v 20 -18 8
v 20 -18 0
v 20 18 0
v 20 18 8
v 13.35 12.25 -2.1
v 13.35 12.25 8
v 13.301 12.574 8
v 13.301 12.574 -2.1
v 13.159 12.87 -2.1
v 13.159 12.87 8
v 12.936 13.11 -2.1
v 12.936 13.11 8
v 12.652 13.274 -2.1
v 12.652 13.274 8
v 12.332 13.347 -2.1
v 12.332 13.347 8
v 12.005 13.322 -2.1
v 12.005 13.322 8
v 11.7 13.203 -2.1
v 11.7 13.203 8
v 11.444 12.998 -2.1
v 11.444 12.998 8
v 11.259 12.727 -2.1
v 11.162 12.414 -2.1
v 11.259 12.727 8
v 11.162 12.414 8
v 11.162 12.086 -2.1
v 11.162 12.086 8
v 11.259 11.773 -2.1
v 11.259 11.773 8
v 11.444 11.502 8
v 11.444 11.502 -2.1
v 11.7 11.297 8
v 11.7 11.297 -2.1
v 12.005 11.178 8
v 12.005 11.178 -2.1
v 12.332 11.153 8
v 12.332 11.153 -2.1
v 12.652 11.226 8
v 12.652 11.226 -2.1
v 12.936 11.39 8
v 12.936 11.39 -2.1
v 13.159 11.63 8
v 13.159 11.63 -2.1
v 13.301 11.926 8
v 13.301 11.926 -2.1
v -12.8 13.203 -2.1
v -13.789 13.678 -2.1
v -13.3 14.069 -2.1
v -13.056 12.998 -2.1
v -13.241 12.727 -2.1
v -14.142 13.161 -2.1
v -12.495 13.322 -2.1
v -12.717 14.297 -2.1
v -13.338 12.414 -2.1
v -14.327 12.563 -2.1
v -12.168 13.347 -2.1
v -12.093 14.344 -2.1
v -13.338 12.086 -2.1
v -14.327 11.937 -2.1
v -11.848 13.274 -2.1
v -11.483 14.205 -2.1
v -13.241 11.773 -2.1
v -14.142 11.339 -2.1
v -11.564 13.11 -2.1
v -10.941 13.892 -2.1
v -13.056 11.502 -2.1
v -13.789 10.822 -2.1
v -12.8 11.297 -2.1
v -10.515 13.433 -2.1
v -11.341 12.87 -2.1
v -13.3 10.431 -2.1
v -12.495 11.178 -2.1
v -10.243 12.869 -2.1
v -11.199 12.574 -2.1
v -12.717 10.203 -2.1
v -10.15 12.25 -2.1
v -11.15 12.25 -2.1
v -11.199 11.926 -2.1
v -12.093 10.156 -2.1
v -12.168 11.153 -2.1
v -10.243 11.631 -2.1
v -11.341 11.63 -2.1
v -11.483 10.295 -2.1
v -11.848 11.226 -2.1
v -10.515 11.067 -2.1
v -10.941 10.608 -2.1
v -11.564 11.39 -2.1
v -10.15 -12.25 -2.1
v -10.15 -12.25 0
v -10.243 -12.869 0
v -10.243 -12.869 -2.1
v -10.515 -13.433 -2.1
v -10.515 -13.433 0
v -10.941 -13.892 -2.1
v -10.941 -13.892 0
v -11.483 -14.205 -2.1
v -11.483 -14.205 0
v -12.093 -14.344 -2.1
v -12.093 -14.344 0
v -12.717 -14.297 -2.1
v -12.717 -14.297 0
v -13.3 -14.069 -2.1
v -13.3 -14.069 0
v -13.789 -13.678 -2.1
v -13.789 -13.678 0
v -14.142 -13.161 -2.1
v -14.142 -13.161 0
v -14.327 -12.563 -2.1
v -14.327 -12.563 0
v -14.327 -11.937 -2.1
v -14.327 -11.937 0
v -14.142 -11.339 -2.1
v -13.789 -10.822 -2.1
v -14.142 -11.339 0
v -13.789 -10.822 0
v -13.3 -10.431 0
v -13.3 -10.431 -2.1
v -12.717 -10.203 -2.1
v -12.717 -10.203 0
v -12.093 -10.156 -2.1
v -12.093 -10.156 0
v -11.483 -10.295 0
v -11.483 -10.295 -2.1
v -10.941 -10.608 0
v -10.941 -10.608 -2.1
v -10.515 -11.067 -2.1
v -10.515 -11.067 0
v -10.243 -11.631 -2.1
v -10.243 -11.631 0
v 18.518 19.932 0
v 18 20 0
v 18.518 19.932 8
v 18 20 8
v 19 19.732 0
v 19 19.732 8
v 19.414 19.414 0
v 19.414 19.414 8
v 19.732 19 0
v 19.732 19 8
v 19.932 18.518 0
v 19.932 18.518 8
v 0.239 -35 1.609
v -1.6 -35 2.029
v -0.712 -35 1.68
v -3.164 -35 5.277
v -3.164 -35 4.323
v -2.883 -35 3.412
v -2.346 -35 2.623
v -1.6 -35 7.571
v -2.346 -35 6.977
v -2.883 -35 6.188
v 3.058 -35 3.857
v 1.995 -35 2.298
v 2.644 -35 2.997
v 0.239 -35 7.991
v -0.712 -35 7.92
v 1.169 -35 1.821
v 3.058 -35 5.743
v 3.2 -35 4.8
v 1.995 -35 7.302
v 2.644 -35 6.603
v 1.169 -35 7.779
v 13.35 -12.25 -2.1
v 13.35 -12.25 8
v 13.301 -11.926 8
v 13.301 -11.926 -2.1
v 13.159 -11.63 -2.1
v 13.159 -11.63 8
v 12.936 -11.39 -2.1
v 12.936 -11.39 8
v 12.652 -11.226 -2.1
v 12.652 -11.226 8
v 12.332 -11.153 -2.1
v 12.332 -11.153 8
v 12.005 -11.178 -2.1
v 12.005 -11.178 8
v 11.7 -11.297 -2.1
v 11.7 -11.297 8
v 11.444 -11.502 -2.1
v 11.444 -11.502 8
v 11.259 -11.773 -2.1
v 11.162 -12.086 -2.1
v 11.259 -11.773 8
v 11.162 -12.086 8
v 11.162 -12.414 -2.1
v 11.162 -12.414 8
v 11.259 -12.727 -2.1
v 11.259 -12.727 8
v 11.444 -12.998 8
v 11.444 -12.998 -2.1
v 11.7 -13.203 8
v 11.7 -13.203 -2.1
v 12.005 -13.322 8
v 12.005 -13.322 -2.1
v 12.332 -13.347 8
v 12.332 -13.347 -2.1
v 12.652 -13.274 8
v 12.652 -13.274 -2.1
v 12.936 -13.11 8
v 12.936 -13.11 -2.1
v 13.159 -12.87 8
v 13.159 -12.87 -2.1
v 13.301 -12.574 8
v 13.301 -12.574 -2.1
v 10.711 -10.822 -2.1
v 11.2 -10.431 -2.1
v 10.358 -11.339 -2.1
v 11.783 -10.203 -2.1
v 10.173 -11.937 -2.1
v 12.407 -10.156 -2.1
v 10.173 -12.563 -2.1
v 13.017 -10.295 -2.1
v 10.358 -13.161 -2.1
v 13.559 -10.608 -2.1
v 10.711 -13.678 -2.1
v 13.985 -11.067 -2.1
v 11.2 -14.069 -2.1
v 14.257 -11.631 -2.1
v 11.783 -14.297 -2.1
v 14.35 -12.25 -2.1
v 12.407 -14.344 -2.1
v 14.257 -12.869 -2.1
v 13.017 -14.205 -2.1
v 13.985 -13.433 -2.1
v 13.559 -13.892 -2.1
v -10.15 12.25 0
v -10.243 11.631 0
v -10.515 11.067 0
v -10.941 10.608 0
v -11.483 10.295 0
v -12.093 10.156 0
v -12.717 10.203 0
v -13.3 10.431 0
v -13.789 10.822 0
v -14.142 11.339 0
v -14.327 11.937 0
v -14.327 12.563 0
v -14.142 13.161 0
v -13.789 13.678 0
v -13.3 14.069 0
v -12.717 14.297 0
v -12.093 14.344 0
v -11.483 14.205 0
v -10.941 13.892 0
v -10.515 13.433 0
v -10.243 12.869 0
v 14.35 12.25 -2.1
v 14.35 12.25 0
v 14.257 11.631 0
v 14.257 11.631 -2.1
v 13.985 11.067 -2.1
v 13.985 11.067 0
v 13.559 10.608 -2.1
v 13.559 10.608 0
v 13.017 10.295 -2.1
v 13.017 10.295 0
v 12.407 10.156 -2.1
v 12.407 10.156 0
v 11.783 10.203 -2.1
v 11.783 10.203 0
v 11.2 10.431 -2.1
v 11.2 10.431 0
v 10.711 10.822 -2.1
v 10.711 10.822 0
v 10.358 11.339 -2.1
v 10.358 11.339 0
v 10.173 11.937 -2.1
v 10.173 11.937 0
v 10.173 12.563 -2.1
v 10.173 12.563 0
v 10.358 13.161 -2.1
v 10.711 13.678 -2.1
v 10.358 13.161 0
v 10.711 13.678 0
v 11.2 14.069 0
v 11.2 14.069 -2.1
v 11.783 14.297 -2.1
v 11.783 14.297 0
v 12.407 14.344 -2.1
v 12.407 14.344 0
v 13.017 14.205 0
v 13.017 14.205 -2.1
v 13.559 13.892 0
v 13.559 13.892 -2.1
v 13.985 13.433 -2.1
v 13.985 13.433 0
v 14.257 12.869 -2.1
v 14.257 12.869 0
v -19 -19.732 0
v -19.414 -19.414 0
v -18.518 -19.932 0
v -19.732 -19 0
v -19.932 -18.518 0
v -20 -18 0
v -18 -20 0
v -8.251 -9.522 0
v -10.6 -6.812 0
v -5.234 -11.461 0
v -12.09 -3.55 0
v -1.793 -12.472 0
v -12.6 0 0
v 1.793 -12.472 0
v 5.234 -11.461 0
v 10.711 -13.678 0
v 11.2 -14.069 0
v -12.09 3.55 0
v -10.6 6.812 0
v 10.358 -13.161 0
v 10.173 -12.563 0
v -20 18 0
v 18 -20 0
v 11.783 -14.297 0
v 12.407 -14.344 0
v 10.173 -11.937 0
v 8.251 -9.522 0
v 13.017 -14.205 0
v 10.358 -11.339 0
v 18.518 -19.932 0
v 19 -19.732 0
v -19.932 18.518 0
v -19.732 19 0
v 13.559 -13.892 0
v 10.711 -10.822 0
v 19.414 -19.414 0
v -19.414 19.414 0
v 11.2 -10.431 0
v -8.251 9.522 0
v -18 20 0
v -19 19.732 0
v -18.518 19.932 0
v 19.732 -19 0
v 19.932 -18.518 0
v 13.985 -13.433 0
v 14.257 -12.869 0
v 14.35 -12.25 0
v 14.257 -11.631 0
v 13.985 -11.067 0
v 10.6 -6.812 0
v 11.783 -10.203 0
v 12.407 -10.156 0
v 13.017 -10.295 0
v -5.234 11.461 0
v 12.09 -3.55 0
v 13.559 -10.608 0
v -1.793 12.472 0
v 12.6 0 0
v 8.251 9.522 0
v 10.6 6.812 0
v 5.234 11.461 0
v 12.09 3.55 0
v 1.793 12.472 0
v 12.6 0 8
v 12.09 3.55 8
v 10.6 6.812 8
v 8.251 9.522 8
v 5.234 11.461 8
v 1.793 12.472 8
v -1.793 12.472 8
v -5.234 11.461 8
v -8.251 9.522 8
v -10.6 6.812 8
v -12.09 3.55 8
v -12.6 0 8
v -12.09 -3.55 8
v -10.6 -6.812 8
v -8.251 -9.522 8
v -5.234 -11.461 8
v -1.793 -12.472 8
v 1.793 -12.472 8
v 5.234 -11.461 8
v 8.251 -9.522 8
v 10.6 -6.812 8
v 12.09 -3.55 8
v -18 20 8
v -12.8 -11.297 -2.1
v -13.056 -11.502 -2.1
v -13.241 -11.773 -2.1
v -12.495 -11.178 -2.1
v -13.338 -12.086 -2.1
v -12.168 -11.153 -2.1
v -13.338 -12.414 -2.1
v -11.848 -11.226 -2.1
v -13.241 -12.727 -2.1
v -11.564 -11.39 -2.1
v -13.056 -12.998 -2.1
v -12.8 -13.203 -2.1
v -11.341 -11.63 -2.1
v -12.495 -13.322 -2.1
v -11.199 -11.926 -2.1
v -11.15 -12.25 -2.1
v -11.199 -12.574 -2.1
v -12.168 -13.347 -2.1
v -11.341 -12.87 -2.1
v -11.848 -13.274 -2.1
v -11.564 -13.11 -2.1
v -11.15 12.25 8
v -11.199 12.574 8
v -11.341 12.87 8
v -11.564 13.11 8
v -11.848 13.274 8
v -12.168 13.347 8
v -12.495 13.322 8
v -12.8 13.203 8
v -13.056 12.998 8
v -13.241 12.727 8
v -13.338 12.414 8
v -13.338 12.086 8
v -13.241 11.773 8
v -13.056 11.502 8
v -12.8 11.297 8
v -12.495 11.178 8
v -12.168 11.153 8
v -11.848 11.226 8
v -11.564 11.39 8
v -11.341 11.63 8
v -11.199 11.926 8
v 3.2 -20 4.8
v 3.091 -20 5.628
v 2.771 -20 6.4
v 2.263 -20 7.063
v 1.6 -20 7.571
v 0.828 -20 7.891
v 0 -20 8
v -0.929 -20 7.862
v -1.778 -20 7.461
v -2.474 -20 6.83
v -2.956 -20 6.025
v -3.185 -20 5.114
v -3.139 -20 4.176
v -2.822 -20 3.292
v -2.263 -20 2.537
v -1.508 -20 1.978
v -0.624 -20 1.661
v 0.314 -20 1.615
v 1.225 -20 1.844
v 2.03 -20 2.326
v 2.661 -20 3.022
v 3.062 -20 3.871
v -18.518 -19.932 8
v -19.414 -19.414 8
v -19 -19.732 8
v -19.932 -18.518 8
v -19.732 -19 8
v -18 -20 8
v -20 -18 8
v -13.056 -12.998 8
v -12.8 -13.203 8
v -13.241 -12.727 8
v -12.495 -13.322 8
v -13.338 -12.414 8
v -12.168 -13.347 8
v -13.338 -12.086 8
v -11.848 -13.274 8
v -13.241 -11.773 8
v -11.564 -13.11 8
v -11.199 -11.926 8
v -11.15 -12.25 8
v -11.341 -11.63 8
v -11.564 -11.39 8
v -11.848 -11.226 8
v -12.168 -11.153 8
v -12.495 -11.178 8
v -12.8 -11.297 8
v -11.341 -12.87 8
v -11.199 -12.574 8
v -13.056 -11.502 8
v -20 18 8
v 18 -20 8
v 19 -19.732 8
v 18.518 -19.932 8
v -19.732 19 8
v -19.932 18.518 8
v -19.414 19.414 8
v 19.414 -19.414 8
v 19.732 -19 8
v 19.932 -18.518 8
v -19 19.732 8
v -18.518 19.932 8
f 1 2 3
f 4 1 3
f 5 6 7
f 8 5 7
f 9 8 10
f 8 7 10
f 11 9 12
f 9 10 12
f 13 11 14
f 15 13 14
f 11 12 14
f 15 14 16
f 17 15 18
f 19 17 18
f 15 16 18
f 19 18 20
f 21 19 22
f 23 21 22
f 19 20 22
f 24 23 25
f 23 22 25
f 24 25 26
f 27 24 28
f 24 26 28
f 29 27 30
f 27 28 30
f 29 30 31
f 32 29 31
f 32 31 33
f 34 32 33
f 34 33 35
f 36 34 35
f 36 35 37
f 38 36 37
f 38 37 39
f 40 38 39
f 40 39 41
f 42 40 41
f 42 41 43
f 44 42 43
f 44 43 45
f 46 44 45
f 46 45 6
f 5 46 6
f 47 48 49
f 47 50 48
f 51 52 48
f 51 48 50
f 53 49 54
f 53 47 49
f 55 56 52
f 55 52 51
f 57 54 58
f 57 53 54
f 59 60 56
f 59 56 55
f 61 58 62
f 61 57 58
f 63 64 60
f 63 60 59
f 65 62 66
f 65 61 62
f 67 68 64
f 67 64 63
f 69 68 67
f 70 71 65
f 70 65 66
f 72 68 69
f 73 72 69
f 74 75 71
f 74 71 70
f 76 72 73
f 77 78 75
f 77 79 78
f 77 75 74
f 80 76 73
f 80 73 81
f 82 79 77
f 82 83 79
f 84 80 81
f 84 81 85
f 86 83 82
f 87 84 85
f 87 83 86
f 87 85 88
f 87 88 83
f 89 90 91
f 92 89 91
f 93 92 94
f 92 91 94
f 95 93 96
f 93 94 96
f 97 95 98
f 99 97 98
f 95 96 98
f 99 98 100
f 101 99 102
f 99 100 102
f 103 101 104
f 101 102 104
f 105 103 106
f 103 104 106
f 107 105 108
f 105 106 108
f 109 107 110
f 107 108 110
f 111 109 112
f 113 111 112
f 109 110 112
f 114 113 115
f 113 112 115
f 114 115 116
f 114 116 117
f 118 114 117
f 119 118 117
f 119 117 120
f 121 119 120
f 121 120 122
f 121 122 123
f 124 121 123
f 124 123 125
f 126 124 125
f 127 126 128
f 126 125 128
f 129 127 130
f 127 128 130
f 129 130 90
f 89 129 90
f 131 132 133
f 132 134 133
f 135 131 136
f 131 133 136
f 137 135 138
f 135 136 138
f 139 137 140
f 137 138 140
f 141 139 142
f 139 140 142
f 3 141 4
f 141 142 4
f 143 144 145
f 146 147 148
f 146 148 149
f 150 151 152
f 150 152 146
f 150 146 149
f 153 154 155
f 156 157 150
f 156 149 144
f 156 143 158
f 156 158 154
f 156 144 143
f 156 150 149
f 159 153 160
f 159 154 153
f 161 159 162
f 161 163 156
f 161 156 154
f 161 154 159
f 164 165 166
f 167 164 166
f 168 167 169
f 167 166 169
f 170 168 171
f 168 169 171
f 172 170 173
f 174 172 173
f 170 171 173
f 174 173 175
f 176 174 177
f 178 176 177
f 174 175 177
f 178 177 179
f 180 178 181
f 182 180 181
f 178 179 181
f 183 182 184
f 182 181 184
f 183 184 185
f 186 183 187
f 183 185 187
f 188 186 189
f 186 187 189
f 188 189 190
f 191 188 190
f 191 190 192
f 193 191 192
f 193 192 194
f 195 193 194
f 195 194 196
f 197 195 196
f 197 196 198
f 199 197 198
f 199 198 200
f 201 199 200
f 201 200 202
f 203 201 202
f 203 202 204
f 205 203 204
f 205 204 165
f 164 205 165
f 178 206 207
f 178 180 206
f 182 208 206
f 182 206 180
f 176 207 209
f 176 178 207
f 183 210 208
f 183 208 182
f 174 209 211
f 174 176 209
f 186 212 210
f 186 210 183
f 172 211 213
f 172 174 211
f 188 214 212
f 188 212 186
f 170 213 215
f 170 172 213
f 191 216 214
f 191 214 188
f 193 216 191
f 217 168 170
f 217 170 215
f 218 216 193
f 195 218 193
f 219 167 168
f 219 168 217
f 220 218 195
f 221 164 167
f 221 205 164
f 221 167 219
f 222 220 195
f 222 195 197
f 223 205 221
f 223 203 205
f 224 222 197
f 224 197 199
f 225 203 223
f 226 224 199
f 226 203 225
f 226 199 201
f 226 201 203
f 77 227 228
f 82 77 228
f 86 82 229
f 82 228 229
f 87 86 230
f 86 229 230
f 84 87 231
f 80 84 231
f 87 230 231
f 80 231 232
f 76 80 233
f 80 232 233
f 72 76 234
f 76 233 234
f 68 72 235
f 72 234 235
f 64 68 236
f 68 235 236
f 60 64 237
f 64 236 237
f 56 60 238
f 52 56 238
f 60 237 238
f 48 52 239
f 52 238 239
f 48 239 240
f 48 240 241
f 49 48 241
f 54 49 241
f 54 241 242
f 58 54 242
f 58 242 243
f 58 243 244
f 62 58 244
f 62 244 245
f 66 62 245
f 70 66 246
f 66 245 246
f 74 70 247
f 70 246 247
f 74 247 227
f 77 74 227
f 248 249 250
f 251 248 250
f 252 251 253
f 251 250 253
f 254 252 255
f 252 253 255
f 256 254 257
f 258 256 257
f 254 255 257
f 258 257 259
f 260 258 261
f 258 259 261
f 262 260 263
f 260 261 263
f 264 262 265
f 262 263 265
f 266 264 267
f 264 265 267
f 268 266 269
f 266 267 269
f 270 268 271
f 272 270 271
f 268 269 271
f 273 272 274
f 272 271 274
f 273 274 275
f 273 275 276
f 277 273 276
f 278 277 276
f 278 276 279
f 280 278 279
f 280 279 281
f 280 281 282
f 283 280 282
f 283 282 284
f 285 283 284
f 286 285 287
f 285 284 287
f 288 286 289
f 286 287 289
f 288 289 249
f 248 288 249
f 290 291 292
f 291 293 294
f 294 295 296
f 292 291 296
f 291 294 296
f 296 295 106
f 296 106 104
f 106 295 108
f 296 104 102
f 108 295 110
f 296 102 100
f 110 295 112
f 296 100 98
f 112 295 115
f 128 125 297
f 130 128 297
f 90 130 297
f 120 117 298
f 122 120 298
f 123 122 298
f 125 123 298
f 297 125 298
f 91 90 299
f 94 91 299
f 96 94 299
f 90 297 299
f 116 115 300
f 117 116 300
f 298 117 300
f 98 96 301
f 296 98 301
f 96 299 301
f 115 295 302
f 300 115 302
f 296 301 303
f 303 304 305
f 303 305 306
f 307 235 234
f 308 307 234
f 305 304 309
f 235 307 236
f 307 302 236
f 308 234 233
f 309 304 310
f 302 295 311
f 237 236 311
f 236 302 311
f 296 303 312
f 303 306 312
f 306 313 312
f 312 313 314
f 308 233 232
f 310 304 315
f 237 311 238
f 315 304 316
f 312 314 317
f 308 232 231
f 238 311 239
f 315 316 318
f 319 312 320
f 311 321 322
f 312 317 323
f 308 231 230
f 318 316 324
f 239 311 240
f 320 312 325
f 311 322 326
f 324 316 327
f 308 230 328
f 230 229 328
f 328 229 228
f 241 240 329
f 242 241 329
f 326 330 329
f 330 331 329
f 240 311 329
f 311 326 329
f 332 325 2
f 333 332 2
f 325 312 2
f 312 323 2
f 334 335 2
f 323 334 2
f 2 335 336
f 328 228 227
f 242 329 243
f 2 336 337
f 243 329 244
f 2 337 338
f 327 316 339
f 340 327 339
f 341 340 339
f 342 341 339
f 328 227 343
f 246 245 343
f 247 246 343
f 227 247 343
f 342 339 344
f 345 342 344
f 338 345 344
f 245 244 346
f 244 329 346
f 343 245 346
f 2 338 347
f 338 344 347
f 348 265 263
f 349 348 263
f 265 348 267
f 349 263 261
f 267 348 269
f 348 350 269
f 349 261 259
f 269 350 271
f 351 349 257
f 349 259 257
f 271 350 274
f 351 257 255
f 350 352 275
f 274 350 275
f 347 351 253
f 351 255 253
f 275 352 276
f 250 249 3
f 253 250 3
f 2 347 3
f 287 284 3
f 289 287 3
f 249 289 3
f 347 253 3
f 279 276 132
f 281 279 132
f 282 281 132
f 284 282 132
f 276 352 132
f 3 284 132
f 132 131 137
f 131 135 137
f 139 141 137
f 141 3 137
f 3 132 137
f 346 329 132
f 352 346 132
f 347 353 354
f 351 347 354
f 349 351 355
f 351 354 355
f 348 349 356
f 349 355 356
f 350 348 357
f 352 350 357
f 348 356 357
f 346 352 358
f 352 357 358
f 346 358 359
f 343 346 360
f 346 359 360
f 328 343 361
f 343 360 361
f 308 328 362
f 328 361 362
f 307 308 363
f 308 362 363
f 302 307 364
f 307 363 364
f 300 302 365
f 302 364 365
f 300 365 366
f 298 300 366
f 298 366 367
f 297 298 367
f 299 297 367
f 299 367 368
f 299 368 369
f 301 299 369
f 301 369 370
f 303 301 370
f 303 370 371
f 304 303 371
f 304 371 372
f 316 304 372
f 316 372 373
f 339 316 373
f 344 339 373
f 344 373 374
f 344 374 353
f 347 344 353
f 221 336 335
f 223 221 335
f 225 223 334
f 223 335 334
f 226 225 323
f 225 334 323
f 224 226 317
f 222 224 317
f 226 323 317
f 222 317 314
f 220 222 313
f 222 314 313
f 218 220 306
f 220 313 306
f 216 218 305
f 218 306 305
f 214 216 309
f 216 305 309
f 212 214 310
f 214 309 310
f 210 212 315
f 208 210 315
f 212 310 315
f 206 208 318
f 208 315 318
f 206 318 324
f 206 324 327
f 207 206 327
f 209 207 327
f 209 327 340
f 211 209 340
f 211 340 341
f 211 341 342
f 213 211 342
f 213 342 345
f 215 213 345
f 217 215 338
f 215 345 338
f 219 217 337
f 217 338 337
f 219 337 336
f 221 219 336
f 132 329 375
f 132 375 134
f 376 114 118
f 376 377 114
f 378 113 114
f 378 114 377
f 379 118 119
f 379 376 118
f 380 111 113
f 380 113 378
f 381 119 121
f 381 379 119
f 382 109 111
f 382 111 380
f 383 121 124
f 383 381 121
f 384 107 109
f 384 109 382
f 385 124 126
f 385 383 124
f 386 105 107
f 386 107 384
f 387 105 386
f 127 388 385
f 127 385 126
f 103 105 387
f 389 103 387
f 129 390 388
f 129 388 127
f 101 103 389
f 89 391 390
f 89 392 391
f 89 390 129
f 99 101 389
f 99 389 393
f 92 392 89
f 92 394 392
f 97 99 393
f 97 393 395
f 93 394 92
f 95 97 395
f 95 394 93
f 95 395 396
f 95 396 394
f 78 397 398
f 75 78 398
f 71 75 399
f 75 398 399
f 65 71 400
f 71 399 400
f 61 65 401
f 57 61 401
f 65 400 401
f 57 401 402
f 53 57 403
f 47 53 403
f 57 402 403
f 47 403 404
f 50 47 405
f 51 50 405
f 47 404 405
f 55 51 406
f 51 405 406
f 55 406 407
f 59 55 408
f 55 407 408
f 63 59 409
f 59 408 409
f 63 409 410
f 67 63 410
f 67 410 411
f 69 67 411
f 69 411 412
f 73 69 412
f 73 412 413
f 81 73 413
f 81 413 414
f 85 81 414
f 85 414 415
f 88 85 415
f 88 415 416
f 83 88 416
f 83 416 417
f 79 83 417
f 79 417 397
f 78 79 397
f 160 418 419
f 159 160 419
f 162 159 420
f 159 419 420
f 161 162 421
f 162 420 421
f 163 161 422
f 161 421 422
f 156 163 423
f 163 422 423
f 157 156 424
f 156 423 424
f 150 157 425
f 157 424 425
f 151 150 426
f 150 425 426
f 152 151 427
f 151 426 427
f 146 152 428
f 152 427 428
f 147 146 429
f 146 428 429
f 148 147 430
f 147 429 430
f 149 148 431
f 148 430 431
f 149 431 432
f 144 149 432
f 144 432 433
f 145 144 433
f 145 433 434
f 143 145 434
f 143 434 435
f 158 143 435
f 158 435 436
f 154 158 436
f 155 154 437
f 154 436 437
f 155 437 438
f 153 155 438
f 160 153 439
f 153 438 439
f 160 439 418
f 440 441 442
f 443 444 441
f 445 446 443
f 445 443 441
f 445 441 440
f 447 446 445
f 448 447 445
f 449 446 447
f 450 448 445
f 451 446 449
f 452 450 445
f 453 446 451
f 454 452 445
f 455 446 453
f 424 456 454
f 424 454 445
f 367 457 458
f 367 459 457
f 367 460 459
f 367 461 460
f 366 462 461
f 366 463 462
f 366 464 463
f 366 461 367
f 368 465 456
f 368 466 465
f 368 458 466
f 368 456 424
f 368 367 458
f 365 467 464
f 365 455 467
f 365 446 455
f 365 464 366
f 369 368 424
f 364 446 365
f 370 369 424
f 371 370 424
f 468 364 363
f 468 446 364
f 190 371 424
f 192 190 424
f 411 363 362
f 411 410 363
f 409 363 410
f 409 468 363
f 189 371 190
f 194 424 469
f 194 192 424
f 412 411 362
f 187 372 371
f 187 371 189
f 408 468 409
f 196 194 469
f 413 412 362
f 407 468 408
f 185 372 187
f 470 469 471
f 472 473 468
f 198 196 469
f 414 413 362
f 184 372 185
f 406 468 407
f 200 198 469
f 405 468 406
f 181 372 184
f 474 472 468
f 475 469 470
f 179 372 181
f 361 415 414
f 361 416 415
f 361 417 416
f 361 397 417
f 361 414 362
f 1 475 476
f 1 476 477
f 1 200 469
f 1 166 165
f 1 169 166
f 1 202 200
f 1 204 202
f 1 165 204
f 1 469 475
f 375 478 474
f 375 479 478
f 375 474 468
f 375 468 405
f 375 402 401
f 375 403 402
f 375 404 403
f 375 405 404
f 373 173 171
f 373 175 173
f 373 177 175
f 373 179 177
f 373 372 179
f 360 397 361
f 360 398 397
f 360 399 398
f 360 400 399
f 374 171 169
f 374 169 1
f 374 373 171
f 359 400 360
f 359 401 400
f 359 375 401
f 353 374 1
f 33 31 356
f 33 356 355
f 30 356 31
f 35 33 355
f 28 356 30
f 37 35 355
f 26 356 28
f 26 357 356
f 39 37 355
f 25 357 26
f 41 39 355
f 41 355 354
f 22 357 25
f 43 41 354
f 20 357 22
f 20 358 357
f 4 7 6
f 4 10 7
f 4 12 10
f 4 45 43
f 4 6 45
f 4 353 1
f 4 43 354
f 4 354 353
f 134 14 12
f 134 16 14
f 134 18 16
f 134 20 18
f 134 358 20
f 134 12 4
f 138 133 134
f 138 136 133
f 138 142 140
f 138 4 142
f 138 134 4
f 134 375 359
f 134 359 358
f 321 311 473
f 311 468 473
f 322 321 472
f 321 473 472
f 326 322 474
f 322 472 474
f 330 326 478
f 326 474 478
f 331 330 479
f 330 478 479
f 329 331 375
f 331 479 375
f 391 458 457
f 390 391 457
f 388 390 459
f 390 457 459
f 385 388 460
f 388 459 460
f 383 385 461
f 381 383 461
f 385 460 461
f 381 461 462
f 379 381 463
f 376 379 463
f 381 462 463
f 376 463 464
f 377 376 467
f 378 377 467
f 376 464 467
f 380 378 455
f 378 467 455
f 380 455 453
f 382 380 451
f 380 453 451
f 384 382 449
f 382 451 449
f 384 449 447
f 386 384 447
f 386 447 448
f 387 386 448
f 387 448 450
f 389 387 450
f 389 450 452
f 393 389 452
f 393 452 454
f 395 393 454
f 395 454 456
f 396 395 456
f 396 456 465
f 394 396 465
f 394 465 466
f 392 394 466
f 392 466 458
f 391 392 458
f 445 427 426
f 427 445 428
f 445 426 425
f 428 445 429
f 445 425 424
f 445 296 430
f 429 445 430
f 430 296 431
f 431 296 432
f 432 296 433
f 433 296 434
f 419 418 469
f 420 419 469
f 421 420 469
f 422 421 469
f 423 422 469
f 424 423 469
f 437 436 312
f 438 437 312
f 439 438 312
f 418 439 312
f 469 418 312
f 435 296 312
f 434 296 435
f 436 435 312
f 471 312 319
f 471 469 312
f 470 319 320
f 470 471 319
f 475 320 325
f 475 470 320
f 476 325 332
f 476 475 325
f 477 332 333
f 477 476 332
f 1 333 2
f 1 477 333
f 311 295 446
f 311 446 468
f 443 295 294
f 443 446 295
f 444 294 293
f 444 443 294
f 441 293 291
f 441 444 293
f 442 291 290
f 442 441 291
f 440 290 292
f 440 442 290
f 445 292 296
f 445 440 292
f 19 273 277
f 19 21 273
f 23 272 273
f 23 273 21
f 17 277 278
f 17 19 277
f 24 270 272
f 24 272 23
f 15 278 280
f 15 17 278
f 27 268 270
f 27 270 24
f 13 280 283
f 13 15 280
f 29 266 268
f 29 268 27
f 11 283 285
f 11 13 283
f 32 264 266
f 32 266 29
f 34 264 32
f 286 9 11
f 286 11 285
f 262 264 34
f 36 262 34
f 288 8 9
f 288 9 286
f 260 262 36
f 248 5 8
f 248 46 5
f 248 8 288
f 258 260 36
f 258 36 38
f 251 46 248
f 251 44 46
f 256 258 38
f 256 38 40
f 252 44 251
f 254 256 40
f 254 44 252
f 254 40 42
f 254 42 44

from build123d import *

# Parameters (mm, degrees)
SKETCH_W      = 40
SKETCH_H      = 40
PAD_DEPTH     = 8
SKETCH002_R   = 12.6
HOLE001_DEPTH = 20.001
FILLET_R      = 2
SKETCH003_R   = 2.1
PAD001_DEPTH  = 2.1
SKETCH001_R   = 1.1
HOLE_DEPTH    = 10.101
SKETCH004_R   = 3.2
PAD002_DEPTH  = 15


with BuildPart() as part:
    # Sketch → Pad (new body)
    with BuildSketch(Plane.XY):
        Rectangle(SKETCH_W, SKETCH_H)
    extrude(amount=PAD_DEPTH)

    # Sketch002 → Hole001 (cut, through all)
    with BuildSketch(Plane.XY.offset(20)):
        Circle(SKETCH002_R)
    extrude(amount=-HOLE001_DEPTH, mode=Mode.SUBTRACT)

    # Fillet
    fillet_edges = [part.edges().sort_by_distance(p)[0] for p in [
        (20, 20, 4),
        (20, -20, 4),
        (-20, -20, 4),
        (-20, 20, 4),
    ]]
    fillet(fillet_edges, radius=FILLET_R)

    # Sketch003 (on Face2 of Fillet) → Pad001 (join)
    with BuildSketch(Plane(origin=(0, 0, 0), x_dir=(1, 0, 0), z_dir=(0, 0, -1))):
        with Locations((-12.25, 12.25)):
            Circle(SKETCH003_R)
        with Locations((12.25, 12.25)):
            Circle(SKETCH003_R)
        with Locations((-12.25, -12.25)):
            Circle(SKETCH003_R)
        with Locations((12.25, -12.25)):
            Circle(SKETCH003_R)
    extrude(amount=PAD001_DEPTH)

    # Sketch001 (on Face6 of Pad) → Hole (cut, through all)
    with BuildSketch(Plane.XY.offset(8)):
        with Locations((12.25, -12.25)):
            Circle(SKETCH001_R)
        with Locations((-12.25, -12.25)):
            Circle(SKETCH001_R)
        with Locations((-12.25, 12.25)):
            Circle(SKETCH001_R)
        with Locations((12.25, 12.25)):
            Circle(SKETCH001_R)
    extrude(amount=-HOLE_DEPTH, mode=Mode.SUBTRACT)

    # Sketch004 (on Face7 of Hole) → Pad002 (join)
    with BuildSketch(Plane.XZ.offset(20)):
        with Locations((0, 4.8)):
            Circle(SKETCH004_R)
    extrude(amount=PAD002_DEPTH)


solid = part.part
